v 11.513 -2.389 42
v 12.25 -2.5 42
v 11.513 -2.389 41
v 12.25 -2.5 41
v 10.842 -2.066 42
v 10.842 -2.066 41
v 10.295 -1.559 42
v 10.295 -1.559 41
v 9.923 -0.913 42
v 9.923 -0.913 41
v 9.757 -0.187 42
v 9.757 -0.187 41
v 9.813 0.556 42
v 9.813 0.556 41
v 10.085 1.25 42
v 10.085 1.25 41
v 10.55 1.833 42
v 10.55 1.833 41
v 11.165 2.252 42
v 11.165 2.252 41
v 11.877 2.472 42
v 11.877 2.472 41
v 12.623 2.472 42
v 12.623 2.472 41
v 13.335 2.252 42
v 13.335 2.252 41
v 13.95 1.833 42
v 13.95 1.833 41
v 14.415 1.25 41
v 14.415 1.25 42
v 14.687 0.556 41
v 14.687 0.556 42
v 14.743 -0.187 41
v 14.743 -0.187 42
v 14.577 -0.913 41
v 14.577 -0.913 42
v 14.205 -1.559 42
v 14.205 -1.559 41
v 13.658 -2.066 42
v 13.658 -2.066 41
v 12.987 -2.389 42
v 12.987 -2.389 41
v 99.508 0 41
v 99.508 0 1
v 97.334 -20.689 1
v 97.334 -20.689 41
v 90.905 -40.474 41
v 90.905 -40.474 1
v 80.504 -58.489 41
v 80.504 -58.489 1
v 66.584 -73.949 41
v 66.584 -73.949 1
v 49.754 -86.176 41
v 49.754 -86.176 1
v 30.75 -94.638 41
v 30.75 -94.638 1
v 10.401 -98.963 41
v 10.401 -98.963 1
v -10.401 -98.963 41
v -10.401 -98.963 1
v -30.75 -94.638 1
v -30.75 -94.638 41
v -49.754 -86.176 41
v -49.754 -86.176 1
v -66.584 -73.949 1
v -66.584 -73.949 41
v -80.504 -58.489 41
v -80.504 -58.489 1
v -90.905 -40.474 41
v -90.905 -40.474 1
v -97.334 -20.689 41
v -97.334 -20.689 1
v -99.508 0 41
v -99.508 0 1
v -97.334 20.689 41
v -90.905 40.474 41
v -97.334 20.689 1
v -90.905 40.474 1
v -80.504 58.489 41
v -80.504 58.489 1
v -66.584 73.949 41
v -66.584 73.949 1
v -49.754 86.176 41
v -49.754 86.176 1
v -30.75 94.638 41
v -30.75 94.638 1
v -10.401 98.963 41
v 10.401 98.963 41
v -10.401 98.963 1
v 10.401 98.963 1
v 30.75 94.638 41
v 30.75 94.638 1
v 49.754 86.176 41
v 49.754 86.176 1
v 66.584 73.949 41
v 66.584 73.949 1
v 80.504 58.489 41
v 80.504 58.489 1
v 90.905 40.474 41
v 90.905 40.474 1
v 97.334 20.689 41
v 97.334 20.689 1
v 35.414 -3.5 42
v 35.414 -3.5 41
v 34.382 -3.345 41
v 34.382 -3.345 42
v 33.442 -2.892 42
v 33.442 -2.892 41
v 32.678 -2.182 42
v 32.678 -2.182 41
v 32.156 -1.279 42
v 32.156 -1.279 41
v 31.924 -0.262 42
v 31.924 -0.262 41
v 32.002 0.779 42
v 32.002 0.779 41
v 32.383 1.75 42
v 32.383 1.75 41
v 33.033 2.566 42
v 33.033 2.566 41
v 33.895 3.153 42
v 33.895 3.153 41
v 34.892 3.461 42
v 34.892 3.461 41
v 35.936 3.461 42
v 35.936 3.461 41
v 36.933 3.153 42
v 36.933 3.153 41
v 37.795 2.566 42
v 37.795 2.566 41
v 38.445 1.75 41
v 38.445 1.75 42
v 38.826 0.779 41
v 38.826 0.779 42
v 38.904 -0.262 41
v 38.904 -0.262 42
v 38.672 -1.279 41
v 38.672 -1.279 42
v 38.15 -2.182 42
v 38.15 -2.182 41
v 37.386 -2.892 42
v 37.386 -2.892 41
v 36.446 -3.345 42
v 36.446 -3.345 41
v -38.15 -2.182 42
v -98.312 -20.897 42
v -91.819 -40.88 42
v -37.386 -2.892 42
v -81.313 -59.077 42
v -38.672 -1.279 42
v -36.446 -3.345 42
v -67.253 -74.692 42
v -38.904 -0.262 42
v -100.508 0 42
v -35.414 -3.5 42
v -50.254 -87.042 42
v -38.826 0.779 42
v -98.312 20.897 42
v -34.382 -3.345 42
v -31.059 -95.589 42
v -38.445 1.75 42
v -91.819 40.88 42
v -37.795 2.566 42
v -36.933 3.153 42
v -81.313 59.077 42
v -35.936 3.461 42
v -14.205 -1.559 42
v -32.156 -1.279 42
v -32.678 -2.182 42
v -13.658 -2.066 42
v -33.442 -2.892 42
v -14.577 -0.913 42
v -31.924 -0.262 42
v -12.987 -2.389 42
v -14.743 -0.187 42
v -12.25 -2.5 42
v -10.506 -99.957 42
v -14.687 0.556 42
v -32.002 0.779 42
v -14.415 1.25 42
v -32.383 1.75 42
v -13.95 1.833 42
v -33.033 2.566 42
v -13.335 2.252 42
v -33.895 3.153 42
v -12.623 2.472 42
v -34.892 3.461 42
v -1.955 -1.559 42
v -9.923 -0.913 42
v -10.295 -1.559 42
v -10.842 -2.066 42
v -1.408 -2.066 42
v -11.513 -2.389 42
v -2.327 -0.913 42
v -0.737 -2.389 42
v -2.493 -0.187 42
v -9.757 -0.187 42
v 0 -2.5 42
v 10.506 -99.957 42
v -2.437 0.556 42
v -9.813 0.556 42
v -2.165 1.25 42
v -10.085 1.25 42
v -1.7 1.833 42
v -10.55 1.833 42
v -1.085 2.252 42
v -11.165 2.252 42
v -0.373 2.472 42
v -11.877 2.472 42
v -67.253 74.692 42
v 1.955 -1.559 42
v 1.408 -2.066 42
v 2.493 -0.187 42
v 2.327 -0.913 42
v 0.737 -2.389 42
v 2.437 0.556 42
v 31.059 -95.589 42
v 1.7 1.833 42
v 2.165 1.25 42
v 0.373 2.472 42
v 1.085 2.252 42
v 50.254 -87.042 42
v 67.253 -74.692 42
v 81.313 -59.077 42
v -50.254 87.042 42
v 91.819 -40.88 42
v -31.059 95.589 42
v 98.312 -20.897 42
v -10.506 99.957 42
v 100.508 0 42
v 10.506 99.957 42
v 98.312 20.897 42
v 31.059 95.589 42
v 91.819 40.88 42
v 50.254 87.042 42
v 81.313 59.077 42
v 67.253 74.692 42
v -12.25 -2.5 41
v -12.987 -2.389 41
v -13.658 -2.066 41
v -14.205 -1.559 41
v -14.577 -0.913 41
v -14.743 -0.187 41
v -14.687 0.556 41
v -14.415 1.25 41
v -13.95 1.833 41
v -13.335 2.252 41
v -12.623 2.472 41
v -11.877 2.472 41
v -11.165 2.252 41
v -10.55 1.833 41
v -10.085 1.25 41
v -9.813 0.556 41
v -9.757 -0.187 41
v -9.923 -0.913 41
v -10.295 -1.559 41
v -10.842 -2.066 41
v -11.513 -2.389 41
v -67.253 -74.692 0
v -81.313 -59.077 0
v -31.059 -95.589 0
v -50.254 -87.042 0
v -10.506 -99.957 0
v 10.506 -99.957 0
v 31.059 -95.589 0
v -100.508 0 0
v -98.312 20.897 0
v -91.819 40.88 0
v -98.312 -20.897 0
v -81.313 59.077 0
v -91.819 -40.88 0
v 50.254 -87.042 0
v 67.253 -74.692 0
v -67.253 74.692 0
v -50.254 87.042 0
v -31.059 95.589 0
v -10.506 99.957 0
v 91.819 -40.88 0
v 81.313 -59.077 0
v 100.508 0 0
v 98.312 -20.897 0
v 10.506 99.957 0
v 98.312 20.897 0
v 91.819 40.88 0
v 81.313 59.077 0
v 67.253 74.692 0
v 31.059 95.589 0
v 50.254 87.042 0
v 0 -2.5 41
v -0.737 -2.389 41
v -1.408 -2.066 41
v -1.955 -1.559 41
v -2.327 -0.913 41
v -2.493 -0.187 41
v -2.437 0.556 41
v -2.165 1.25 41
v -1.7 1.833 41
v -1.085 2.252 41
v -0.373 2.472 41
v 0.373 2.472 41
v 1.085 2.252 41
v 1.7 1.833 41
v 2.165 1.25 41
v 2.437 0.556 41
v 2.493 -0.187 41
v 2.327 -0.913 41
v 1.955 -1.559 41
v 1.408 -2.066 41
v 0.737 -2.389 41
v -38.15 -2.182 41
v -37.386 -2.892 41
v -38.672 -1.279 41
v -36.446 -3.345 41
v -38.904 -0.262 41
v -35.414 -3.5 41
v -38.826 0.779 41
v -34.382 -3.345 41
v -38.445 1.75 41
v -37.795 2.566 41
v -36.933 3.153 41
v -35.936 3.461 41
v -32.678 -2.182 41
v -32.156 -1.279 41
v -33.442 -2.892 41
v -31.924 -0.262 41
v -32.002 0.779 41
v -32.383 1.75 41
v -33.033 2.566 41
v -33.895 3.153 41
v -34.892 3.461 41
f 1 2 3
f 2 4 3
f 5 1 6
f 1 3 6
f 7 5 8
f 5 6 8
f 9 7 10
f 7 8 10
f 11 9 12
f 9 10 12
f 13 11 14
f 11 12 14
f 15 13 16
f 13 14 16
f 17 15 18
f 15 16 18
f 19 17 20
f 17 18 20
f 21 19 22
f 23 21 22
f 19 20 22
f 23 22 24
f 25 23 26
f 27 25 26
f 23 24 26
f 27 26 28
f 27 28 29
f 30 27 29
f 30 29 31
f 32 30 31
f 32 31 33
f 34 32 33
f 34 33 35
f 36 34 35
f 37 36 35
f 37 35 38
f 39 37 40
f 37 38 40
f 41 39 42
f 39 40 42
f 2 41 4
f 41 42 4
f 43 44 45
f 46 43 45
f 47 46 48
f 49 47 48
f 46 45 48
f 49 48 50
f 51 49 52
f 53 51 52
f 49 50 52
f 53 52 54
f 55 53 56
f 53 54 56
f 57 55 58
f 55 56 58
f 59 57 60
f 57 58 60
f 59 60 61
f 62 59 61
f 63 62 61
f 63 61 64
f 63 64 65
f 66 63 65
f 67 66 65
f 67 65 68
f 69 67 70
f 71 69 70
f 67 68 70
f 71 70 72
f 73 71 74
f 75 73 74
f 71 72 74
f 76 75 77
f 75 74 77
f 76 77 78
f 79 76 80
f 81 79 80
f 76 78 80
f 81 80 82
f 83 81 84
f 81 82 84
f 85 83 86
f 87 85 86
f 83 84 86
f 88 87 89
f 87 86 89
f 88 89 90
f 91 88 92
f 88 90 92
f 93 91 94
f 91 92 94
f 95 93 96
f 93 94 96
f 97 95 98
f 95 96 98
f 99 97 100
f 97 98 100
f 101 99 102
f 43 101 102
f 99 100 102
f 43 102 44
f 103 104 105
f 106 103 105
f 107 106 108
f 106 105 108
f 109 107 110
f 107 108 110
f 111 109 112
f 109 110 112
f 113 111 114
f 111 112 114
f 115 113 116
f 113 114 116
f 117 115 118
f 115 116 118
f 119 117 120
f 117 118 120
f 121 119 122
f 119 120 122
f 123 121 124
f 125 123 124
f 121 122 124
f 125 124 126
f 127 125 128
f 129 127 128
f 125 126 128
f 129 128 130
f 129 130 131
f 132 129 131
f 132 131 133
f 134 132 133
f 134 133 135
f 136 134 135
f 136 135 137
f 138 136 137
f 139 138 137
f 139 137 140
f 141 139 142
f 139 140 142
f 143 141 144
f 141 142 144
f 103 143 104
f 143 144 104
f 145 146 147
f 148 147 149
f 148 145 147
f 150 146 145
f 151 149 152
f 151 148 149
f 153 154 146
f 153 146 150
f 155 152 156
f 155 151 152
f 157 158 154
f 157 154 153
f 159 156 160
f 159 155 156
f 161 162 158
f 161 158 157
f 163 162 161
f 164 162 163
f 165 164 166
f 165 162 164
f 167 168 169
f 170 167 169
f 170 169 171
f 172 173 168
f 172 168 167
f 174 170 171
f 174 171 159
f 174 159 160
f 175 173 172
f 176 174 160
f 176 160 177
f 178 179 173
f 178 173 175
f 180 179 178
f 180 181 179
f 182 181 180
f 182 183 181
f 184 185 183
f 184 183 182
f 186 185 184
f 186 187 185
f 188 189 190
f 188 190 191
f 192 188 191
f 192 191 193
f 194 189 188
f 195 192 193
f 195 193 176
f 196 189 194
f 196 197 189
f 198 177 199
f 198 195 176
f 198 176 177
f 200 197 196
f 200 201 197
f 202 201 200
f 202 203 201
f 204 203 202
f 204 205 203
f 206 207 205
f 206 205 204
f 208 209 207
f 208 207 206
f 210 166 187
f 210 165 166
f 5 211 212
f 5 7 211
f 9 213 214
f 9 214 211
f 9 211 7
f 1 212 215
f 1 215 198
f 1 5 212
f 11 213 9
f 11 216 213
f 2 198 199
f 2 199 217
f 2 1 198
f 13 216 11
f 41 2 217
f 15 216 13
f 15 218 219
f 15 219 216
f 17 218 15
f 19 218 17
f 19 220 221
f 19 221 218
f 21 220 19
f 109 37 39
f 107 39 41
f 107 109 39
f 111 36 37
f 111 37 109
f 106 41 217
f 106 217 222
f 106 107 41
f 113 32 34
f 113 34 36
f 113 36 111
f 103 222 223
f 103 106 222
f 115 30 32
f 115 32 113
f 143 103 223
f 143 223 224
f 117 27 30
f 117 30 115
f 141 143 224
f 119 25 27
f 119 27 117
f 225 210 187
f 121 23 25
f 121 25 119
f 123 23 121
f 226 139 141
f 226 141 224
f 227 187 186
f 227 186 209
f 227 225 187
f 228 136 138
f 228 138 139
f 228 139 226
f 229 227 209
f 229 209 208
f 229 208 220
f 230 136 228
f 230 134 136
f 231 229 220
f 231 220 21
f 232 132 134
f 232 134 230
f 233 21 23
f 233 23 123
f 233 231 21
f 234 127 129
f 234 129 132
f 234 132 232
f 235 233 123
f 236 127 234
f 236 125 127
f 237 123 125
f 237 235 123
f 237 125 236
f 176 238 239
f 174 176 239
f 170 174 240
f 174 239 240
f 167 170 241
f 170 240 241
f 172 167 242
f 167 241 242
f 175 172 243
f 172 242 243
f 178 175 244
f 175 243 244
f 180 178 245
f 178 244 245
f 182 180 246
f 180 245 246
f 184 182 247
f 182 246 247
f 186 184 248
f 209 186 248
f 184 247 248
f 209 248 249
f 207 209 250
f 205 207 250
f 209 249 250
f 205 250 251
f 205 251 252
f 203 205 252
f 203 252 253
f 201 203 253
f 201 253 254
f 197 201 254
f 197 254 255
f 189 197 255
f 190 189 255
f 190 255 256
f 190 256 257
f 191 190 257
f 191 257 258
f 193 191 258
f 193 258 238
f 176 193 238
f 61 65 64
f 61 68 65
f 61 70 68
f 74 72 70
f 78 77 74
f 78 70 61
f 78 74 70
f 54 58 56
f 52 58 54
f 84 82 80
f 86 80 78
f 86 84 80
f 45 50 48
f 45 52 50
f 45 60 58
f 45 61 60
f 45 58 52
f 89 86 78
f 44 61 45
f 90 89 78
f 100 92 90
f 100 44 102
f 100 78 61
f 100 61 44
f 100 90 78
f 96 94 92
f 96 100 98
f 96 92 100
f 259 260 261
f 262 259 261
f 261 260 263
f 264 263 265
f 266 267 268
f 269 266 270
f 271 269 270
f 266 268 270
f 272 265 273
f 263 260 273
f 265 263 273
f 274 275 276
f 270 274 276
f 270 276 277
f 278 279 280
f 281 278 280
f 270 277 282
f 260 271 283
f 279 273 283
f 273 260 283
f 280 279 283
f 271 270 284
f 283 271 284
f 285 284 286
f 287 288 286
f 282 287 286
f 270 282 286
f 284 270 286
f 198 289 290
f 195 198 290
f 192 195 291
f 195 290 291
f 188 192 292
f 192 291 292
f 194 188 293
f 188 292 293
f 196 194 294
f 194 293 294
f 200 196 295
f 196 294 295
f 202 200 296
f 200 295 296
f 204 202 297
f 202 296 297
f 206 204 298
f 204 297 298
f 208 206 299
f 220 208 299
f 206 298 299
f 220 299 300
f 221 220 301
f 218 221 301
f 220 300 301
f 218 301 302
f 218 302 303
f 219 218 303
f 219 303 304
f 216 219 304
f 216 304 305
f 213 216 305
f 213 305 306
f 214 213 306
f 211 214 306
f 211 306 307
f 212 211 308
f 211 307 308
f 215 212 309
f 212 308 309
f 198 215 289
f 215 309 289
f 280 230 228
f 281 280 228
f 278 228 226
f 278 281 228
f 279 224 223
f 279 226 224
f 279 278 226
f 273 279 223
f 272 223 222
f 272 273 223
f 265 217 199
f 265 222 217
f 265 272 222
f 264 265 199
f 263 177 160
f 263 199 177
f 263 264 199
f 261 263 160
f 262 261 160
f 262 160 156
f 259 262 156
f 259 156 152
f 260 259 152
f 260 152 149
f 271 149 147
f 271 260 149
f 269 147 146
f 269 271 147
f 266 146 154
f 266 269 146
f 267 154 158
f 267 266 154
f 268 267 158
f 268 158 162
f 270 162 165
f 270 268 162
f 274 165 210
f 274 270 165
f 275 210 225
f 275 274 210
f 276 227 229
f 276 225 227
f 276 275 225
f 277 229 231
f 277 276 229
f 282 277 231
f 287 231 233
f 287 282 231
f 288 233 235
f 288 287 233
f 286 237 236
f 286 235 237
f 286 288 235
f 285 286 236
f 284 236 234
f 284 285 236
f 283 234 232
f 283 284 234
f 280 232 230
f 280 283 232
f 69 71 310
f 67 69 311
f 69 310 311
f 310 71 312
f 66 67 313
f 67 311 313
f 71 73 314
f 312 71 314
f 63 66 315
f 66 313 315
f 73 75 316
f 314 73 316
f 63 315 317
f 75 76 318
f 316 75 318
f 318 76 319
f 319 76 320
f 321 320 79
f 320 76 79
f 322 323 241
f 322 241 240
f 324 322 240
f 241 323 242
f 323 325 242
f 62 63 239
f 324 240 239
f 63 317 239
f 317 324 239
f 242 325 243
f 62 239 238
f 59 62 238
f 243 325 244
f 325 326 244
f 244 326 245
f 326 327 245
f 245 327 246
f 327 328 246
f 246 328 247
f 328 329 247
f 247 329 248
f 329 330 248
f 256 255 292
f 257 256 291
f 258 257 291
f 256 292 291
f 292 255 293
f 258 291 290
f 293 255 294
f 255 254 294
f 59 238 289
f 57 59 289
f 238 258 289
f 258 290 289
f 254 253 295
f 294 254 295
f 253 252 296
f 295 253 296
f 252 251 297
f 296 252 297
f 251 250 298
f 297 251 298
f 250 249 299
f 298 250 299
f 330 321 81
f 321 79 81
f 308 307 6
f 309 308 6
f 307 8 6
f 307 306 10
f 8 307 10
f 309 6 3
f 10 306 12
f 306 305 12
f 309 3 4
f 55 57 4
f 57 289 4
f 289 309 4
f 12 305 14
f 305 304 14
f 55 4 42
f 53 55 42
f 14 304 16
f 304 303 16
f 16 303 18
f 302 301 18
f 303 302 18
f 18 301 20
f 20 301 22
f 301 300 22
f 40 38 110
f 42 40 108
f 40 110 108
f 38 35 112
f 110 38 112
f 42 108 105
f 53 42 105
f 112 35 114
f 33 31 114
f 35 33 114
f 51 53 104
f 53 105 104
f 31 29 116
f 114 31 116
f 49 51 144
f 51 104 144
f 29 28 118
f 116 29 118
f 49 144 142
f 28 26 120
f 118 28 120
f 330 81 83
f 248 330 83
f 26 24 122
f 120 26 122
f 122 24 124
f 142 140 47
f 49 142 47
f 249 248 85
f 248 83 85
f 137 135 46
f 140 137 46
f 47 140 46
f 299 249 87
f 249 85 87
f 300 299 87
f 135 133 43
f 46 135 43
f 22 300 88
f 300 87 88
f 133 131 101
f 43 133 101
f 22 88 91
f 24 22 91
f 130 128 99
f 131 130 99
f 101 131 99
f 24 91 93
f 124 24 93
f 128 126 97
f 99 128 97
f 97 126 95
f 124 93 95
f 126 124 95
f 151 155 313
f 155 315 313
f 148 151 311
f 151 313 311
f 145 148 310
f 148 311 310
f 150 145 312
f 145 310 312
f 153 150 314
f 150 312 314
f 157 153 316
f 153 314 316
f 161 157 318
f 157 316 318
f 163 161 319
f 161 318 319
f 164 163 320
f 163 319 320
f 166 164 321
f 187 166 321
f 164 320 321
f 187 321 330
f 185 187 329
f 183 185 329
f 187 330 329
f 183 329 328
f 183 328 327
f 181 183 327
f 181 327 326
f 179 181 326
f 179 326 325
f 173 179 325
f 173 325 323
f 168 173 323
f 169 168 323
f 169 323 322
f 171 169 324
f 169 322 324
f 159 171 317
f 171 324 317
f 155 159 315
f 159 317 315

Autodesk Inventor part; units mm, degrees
ref_plane "YZ Plane" through (0, 0, 0) normal (1, 0, 0) x (0, 1, 0)
ref_plane "XZ Plane" through (0, 0, 0) normal (0, 1, 0) x (-1, 0, 0)
ref_plane "XY Plane" through (0, 0, 0) normal (0, 0, 1) x (1, 0, 0)
sketch "Sketch1" plane through (0, 0, 0) normal (0, 0, 1) x (1, 0, 0)
  circle A0 centre (0, 0) radius 100.508
  dimension "OuterVesselInnerdiameter" = 201.016
extrude "Extrusion1" add sketch "Sketch1" along normal blind 42
shell "Shell2" thickness 1 removed faces 0
sketch "Sketch2" plane through (0, 0, 42) normal (0, 0, 1) x (1, 0, 0)
  line L0 (0, 0) -> (-12.25, 0)
  line L1 (0, 0) -> (12.25, 0)
  point P0 (35.414, 0)
  point P1 (-35.414, 0)
  dimension "d30" = 24.5
hole "Hole1" at (-12.25, 0, 42) at (0, 0, 42) at (12.25, 0, 42) direction (0, 0, -1) diameter 5 depth 1
hole "Hole2" at (35.414, 0, 42) at (-35.414, 0, 42) direction (0, 0, -1) diameter 7 depth 1
equation "\"OuterVesselInnerdiameter\" = 4 * CrucibleThickness + 4 * CrucibleInnerDiameter"
equation "\"height\" = 1.4 * SupportHeight + 1.4 * crucible_height"
equation "\"d30\" = DistanceBetweenHolesSweep"
equation "\"d14\" = PenetrationOuterDiameter"
equation "\"d23\" = PenetrationUpstreamInnerDiameter + 2 * PenetrationUpstreamThickness"
equation "\"OuterVesselTopHolesSpacing\" = DistanceBetweenHolesSweep"
equation "\"CrucibleThickness\" = 0.254"
equation "\"CrucibleDistanceBetweenTopHoles\" = 7.62"
equation "\"OuterVesselBottomHolesSpacing\" = CrucibleThickness + 0.5 * CrucibleInnerDiameter + PenetrationUpstreamDistanceFromWallToCentre"
equation "\"CrucibleInnerDiameter\" = 50"
equation "\"SupportHeight\" = 10"
equation "\"crucible_height\" = 20"
equation "\"DistanceBetweenHolesSweep\" = 24.499987"
equation "\"PenetrationOuterDiameter\" = 5"
equation "\"PenetrationUpstreamInnerDiameter\" = 5"
equation "\"PenetrationUpstreamThickness\" = 1"
equation "\"PenetrationUpstreamDistanceFromWallToCentre\" = 10.16"
properties part number "outer vessel"
